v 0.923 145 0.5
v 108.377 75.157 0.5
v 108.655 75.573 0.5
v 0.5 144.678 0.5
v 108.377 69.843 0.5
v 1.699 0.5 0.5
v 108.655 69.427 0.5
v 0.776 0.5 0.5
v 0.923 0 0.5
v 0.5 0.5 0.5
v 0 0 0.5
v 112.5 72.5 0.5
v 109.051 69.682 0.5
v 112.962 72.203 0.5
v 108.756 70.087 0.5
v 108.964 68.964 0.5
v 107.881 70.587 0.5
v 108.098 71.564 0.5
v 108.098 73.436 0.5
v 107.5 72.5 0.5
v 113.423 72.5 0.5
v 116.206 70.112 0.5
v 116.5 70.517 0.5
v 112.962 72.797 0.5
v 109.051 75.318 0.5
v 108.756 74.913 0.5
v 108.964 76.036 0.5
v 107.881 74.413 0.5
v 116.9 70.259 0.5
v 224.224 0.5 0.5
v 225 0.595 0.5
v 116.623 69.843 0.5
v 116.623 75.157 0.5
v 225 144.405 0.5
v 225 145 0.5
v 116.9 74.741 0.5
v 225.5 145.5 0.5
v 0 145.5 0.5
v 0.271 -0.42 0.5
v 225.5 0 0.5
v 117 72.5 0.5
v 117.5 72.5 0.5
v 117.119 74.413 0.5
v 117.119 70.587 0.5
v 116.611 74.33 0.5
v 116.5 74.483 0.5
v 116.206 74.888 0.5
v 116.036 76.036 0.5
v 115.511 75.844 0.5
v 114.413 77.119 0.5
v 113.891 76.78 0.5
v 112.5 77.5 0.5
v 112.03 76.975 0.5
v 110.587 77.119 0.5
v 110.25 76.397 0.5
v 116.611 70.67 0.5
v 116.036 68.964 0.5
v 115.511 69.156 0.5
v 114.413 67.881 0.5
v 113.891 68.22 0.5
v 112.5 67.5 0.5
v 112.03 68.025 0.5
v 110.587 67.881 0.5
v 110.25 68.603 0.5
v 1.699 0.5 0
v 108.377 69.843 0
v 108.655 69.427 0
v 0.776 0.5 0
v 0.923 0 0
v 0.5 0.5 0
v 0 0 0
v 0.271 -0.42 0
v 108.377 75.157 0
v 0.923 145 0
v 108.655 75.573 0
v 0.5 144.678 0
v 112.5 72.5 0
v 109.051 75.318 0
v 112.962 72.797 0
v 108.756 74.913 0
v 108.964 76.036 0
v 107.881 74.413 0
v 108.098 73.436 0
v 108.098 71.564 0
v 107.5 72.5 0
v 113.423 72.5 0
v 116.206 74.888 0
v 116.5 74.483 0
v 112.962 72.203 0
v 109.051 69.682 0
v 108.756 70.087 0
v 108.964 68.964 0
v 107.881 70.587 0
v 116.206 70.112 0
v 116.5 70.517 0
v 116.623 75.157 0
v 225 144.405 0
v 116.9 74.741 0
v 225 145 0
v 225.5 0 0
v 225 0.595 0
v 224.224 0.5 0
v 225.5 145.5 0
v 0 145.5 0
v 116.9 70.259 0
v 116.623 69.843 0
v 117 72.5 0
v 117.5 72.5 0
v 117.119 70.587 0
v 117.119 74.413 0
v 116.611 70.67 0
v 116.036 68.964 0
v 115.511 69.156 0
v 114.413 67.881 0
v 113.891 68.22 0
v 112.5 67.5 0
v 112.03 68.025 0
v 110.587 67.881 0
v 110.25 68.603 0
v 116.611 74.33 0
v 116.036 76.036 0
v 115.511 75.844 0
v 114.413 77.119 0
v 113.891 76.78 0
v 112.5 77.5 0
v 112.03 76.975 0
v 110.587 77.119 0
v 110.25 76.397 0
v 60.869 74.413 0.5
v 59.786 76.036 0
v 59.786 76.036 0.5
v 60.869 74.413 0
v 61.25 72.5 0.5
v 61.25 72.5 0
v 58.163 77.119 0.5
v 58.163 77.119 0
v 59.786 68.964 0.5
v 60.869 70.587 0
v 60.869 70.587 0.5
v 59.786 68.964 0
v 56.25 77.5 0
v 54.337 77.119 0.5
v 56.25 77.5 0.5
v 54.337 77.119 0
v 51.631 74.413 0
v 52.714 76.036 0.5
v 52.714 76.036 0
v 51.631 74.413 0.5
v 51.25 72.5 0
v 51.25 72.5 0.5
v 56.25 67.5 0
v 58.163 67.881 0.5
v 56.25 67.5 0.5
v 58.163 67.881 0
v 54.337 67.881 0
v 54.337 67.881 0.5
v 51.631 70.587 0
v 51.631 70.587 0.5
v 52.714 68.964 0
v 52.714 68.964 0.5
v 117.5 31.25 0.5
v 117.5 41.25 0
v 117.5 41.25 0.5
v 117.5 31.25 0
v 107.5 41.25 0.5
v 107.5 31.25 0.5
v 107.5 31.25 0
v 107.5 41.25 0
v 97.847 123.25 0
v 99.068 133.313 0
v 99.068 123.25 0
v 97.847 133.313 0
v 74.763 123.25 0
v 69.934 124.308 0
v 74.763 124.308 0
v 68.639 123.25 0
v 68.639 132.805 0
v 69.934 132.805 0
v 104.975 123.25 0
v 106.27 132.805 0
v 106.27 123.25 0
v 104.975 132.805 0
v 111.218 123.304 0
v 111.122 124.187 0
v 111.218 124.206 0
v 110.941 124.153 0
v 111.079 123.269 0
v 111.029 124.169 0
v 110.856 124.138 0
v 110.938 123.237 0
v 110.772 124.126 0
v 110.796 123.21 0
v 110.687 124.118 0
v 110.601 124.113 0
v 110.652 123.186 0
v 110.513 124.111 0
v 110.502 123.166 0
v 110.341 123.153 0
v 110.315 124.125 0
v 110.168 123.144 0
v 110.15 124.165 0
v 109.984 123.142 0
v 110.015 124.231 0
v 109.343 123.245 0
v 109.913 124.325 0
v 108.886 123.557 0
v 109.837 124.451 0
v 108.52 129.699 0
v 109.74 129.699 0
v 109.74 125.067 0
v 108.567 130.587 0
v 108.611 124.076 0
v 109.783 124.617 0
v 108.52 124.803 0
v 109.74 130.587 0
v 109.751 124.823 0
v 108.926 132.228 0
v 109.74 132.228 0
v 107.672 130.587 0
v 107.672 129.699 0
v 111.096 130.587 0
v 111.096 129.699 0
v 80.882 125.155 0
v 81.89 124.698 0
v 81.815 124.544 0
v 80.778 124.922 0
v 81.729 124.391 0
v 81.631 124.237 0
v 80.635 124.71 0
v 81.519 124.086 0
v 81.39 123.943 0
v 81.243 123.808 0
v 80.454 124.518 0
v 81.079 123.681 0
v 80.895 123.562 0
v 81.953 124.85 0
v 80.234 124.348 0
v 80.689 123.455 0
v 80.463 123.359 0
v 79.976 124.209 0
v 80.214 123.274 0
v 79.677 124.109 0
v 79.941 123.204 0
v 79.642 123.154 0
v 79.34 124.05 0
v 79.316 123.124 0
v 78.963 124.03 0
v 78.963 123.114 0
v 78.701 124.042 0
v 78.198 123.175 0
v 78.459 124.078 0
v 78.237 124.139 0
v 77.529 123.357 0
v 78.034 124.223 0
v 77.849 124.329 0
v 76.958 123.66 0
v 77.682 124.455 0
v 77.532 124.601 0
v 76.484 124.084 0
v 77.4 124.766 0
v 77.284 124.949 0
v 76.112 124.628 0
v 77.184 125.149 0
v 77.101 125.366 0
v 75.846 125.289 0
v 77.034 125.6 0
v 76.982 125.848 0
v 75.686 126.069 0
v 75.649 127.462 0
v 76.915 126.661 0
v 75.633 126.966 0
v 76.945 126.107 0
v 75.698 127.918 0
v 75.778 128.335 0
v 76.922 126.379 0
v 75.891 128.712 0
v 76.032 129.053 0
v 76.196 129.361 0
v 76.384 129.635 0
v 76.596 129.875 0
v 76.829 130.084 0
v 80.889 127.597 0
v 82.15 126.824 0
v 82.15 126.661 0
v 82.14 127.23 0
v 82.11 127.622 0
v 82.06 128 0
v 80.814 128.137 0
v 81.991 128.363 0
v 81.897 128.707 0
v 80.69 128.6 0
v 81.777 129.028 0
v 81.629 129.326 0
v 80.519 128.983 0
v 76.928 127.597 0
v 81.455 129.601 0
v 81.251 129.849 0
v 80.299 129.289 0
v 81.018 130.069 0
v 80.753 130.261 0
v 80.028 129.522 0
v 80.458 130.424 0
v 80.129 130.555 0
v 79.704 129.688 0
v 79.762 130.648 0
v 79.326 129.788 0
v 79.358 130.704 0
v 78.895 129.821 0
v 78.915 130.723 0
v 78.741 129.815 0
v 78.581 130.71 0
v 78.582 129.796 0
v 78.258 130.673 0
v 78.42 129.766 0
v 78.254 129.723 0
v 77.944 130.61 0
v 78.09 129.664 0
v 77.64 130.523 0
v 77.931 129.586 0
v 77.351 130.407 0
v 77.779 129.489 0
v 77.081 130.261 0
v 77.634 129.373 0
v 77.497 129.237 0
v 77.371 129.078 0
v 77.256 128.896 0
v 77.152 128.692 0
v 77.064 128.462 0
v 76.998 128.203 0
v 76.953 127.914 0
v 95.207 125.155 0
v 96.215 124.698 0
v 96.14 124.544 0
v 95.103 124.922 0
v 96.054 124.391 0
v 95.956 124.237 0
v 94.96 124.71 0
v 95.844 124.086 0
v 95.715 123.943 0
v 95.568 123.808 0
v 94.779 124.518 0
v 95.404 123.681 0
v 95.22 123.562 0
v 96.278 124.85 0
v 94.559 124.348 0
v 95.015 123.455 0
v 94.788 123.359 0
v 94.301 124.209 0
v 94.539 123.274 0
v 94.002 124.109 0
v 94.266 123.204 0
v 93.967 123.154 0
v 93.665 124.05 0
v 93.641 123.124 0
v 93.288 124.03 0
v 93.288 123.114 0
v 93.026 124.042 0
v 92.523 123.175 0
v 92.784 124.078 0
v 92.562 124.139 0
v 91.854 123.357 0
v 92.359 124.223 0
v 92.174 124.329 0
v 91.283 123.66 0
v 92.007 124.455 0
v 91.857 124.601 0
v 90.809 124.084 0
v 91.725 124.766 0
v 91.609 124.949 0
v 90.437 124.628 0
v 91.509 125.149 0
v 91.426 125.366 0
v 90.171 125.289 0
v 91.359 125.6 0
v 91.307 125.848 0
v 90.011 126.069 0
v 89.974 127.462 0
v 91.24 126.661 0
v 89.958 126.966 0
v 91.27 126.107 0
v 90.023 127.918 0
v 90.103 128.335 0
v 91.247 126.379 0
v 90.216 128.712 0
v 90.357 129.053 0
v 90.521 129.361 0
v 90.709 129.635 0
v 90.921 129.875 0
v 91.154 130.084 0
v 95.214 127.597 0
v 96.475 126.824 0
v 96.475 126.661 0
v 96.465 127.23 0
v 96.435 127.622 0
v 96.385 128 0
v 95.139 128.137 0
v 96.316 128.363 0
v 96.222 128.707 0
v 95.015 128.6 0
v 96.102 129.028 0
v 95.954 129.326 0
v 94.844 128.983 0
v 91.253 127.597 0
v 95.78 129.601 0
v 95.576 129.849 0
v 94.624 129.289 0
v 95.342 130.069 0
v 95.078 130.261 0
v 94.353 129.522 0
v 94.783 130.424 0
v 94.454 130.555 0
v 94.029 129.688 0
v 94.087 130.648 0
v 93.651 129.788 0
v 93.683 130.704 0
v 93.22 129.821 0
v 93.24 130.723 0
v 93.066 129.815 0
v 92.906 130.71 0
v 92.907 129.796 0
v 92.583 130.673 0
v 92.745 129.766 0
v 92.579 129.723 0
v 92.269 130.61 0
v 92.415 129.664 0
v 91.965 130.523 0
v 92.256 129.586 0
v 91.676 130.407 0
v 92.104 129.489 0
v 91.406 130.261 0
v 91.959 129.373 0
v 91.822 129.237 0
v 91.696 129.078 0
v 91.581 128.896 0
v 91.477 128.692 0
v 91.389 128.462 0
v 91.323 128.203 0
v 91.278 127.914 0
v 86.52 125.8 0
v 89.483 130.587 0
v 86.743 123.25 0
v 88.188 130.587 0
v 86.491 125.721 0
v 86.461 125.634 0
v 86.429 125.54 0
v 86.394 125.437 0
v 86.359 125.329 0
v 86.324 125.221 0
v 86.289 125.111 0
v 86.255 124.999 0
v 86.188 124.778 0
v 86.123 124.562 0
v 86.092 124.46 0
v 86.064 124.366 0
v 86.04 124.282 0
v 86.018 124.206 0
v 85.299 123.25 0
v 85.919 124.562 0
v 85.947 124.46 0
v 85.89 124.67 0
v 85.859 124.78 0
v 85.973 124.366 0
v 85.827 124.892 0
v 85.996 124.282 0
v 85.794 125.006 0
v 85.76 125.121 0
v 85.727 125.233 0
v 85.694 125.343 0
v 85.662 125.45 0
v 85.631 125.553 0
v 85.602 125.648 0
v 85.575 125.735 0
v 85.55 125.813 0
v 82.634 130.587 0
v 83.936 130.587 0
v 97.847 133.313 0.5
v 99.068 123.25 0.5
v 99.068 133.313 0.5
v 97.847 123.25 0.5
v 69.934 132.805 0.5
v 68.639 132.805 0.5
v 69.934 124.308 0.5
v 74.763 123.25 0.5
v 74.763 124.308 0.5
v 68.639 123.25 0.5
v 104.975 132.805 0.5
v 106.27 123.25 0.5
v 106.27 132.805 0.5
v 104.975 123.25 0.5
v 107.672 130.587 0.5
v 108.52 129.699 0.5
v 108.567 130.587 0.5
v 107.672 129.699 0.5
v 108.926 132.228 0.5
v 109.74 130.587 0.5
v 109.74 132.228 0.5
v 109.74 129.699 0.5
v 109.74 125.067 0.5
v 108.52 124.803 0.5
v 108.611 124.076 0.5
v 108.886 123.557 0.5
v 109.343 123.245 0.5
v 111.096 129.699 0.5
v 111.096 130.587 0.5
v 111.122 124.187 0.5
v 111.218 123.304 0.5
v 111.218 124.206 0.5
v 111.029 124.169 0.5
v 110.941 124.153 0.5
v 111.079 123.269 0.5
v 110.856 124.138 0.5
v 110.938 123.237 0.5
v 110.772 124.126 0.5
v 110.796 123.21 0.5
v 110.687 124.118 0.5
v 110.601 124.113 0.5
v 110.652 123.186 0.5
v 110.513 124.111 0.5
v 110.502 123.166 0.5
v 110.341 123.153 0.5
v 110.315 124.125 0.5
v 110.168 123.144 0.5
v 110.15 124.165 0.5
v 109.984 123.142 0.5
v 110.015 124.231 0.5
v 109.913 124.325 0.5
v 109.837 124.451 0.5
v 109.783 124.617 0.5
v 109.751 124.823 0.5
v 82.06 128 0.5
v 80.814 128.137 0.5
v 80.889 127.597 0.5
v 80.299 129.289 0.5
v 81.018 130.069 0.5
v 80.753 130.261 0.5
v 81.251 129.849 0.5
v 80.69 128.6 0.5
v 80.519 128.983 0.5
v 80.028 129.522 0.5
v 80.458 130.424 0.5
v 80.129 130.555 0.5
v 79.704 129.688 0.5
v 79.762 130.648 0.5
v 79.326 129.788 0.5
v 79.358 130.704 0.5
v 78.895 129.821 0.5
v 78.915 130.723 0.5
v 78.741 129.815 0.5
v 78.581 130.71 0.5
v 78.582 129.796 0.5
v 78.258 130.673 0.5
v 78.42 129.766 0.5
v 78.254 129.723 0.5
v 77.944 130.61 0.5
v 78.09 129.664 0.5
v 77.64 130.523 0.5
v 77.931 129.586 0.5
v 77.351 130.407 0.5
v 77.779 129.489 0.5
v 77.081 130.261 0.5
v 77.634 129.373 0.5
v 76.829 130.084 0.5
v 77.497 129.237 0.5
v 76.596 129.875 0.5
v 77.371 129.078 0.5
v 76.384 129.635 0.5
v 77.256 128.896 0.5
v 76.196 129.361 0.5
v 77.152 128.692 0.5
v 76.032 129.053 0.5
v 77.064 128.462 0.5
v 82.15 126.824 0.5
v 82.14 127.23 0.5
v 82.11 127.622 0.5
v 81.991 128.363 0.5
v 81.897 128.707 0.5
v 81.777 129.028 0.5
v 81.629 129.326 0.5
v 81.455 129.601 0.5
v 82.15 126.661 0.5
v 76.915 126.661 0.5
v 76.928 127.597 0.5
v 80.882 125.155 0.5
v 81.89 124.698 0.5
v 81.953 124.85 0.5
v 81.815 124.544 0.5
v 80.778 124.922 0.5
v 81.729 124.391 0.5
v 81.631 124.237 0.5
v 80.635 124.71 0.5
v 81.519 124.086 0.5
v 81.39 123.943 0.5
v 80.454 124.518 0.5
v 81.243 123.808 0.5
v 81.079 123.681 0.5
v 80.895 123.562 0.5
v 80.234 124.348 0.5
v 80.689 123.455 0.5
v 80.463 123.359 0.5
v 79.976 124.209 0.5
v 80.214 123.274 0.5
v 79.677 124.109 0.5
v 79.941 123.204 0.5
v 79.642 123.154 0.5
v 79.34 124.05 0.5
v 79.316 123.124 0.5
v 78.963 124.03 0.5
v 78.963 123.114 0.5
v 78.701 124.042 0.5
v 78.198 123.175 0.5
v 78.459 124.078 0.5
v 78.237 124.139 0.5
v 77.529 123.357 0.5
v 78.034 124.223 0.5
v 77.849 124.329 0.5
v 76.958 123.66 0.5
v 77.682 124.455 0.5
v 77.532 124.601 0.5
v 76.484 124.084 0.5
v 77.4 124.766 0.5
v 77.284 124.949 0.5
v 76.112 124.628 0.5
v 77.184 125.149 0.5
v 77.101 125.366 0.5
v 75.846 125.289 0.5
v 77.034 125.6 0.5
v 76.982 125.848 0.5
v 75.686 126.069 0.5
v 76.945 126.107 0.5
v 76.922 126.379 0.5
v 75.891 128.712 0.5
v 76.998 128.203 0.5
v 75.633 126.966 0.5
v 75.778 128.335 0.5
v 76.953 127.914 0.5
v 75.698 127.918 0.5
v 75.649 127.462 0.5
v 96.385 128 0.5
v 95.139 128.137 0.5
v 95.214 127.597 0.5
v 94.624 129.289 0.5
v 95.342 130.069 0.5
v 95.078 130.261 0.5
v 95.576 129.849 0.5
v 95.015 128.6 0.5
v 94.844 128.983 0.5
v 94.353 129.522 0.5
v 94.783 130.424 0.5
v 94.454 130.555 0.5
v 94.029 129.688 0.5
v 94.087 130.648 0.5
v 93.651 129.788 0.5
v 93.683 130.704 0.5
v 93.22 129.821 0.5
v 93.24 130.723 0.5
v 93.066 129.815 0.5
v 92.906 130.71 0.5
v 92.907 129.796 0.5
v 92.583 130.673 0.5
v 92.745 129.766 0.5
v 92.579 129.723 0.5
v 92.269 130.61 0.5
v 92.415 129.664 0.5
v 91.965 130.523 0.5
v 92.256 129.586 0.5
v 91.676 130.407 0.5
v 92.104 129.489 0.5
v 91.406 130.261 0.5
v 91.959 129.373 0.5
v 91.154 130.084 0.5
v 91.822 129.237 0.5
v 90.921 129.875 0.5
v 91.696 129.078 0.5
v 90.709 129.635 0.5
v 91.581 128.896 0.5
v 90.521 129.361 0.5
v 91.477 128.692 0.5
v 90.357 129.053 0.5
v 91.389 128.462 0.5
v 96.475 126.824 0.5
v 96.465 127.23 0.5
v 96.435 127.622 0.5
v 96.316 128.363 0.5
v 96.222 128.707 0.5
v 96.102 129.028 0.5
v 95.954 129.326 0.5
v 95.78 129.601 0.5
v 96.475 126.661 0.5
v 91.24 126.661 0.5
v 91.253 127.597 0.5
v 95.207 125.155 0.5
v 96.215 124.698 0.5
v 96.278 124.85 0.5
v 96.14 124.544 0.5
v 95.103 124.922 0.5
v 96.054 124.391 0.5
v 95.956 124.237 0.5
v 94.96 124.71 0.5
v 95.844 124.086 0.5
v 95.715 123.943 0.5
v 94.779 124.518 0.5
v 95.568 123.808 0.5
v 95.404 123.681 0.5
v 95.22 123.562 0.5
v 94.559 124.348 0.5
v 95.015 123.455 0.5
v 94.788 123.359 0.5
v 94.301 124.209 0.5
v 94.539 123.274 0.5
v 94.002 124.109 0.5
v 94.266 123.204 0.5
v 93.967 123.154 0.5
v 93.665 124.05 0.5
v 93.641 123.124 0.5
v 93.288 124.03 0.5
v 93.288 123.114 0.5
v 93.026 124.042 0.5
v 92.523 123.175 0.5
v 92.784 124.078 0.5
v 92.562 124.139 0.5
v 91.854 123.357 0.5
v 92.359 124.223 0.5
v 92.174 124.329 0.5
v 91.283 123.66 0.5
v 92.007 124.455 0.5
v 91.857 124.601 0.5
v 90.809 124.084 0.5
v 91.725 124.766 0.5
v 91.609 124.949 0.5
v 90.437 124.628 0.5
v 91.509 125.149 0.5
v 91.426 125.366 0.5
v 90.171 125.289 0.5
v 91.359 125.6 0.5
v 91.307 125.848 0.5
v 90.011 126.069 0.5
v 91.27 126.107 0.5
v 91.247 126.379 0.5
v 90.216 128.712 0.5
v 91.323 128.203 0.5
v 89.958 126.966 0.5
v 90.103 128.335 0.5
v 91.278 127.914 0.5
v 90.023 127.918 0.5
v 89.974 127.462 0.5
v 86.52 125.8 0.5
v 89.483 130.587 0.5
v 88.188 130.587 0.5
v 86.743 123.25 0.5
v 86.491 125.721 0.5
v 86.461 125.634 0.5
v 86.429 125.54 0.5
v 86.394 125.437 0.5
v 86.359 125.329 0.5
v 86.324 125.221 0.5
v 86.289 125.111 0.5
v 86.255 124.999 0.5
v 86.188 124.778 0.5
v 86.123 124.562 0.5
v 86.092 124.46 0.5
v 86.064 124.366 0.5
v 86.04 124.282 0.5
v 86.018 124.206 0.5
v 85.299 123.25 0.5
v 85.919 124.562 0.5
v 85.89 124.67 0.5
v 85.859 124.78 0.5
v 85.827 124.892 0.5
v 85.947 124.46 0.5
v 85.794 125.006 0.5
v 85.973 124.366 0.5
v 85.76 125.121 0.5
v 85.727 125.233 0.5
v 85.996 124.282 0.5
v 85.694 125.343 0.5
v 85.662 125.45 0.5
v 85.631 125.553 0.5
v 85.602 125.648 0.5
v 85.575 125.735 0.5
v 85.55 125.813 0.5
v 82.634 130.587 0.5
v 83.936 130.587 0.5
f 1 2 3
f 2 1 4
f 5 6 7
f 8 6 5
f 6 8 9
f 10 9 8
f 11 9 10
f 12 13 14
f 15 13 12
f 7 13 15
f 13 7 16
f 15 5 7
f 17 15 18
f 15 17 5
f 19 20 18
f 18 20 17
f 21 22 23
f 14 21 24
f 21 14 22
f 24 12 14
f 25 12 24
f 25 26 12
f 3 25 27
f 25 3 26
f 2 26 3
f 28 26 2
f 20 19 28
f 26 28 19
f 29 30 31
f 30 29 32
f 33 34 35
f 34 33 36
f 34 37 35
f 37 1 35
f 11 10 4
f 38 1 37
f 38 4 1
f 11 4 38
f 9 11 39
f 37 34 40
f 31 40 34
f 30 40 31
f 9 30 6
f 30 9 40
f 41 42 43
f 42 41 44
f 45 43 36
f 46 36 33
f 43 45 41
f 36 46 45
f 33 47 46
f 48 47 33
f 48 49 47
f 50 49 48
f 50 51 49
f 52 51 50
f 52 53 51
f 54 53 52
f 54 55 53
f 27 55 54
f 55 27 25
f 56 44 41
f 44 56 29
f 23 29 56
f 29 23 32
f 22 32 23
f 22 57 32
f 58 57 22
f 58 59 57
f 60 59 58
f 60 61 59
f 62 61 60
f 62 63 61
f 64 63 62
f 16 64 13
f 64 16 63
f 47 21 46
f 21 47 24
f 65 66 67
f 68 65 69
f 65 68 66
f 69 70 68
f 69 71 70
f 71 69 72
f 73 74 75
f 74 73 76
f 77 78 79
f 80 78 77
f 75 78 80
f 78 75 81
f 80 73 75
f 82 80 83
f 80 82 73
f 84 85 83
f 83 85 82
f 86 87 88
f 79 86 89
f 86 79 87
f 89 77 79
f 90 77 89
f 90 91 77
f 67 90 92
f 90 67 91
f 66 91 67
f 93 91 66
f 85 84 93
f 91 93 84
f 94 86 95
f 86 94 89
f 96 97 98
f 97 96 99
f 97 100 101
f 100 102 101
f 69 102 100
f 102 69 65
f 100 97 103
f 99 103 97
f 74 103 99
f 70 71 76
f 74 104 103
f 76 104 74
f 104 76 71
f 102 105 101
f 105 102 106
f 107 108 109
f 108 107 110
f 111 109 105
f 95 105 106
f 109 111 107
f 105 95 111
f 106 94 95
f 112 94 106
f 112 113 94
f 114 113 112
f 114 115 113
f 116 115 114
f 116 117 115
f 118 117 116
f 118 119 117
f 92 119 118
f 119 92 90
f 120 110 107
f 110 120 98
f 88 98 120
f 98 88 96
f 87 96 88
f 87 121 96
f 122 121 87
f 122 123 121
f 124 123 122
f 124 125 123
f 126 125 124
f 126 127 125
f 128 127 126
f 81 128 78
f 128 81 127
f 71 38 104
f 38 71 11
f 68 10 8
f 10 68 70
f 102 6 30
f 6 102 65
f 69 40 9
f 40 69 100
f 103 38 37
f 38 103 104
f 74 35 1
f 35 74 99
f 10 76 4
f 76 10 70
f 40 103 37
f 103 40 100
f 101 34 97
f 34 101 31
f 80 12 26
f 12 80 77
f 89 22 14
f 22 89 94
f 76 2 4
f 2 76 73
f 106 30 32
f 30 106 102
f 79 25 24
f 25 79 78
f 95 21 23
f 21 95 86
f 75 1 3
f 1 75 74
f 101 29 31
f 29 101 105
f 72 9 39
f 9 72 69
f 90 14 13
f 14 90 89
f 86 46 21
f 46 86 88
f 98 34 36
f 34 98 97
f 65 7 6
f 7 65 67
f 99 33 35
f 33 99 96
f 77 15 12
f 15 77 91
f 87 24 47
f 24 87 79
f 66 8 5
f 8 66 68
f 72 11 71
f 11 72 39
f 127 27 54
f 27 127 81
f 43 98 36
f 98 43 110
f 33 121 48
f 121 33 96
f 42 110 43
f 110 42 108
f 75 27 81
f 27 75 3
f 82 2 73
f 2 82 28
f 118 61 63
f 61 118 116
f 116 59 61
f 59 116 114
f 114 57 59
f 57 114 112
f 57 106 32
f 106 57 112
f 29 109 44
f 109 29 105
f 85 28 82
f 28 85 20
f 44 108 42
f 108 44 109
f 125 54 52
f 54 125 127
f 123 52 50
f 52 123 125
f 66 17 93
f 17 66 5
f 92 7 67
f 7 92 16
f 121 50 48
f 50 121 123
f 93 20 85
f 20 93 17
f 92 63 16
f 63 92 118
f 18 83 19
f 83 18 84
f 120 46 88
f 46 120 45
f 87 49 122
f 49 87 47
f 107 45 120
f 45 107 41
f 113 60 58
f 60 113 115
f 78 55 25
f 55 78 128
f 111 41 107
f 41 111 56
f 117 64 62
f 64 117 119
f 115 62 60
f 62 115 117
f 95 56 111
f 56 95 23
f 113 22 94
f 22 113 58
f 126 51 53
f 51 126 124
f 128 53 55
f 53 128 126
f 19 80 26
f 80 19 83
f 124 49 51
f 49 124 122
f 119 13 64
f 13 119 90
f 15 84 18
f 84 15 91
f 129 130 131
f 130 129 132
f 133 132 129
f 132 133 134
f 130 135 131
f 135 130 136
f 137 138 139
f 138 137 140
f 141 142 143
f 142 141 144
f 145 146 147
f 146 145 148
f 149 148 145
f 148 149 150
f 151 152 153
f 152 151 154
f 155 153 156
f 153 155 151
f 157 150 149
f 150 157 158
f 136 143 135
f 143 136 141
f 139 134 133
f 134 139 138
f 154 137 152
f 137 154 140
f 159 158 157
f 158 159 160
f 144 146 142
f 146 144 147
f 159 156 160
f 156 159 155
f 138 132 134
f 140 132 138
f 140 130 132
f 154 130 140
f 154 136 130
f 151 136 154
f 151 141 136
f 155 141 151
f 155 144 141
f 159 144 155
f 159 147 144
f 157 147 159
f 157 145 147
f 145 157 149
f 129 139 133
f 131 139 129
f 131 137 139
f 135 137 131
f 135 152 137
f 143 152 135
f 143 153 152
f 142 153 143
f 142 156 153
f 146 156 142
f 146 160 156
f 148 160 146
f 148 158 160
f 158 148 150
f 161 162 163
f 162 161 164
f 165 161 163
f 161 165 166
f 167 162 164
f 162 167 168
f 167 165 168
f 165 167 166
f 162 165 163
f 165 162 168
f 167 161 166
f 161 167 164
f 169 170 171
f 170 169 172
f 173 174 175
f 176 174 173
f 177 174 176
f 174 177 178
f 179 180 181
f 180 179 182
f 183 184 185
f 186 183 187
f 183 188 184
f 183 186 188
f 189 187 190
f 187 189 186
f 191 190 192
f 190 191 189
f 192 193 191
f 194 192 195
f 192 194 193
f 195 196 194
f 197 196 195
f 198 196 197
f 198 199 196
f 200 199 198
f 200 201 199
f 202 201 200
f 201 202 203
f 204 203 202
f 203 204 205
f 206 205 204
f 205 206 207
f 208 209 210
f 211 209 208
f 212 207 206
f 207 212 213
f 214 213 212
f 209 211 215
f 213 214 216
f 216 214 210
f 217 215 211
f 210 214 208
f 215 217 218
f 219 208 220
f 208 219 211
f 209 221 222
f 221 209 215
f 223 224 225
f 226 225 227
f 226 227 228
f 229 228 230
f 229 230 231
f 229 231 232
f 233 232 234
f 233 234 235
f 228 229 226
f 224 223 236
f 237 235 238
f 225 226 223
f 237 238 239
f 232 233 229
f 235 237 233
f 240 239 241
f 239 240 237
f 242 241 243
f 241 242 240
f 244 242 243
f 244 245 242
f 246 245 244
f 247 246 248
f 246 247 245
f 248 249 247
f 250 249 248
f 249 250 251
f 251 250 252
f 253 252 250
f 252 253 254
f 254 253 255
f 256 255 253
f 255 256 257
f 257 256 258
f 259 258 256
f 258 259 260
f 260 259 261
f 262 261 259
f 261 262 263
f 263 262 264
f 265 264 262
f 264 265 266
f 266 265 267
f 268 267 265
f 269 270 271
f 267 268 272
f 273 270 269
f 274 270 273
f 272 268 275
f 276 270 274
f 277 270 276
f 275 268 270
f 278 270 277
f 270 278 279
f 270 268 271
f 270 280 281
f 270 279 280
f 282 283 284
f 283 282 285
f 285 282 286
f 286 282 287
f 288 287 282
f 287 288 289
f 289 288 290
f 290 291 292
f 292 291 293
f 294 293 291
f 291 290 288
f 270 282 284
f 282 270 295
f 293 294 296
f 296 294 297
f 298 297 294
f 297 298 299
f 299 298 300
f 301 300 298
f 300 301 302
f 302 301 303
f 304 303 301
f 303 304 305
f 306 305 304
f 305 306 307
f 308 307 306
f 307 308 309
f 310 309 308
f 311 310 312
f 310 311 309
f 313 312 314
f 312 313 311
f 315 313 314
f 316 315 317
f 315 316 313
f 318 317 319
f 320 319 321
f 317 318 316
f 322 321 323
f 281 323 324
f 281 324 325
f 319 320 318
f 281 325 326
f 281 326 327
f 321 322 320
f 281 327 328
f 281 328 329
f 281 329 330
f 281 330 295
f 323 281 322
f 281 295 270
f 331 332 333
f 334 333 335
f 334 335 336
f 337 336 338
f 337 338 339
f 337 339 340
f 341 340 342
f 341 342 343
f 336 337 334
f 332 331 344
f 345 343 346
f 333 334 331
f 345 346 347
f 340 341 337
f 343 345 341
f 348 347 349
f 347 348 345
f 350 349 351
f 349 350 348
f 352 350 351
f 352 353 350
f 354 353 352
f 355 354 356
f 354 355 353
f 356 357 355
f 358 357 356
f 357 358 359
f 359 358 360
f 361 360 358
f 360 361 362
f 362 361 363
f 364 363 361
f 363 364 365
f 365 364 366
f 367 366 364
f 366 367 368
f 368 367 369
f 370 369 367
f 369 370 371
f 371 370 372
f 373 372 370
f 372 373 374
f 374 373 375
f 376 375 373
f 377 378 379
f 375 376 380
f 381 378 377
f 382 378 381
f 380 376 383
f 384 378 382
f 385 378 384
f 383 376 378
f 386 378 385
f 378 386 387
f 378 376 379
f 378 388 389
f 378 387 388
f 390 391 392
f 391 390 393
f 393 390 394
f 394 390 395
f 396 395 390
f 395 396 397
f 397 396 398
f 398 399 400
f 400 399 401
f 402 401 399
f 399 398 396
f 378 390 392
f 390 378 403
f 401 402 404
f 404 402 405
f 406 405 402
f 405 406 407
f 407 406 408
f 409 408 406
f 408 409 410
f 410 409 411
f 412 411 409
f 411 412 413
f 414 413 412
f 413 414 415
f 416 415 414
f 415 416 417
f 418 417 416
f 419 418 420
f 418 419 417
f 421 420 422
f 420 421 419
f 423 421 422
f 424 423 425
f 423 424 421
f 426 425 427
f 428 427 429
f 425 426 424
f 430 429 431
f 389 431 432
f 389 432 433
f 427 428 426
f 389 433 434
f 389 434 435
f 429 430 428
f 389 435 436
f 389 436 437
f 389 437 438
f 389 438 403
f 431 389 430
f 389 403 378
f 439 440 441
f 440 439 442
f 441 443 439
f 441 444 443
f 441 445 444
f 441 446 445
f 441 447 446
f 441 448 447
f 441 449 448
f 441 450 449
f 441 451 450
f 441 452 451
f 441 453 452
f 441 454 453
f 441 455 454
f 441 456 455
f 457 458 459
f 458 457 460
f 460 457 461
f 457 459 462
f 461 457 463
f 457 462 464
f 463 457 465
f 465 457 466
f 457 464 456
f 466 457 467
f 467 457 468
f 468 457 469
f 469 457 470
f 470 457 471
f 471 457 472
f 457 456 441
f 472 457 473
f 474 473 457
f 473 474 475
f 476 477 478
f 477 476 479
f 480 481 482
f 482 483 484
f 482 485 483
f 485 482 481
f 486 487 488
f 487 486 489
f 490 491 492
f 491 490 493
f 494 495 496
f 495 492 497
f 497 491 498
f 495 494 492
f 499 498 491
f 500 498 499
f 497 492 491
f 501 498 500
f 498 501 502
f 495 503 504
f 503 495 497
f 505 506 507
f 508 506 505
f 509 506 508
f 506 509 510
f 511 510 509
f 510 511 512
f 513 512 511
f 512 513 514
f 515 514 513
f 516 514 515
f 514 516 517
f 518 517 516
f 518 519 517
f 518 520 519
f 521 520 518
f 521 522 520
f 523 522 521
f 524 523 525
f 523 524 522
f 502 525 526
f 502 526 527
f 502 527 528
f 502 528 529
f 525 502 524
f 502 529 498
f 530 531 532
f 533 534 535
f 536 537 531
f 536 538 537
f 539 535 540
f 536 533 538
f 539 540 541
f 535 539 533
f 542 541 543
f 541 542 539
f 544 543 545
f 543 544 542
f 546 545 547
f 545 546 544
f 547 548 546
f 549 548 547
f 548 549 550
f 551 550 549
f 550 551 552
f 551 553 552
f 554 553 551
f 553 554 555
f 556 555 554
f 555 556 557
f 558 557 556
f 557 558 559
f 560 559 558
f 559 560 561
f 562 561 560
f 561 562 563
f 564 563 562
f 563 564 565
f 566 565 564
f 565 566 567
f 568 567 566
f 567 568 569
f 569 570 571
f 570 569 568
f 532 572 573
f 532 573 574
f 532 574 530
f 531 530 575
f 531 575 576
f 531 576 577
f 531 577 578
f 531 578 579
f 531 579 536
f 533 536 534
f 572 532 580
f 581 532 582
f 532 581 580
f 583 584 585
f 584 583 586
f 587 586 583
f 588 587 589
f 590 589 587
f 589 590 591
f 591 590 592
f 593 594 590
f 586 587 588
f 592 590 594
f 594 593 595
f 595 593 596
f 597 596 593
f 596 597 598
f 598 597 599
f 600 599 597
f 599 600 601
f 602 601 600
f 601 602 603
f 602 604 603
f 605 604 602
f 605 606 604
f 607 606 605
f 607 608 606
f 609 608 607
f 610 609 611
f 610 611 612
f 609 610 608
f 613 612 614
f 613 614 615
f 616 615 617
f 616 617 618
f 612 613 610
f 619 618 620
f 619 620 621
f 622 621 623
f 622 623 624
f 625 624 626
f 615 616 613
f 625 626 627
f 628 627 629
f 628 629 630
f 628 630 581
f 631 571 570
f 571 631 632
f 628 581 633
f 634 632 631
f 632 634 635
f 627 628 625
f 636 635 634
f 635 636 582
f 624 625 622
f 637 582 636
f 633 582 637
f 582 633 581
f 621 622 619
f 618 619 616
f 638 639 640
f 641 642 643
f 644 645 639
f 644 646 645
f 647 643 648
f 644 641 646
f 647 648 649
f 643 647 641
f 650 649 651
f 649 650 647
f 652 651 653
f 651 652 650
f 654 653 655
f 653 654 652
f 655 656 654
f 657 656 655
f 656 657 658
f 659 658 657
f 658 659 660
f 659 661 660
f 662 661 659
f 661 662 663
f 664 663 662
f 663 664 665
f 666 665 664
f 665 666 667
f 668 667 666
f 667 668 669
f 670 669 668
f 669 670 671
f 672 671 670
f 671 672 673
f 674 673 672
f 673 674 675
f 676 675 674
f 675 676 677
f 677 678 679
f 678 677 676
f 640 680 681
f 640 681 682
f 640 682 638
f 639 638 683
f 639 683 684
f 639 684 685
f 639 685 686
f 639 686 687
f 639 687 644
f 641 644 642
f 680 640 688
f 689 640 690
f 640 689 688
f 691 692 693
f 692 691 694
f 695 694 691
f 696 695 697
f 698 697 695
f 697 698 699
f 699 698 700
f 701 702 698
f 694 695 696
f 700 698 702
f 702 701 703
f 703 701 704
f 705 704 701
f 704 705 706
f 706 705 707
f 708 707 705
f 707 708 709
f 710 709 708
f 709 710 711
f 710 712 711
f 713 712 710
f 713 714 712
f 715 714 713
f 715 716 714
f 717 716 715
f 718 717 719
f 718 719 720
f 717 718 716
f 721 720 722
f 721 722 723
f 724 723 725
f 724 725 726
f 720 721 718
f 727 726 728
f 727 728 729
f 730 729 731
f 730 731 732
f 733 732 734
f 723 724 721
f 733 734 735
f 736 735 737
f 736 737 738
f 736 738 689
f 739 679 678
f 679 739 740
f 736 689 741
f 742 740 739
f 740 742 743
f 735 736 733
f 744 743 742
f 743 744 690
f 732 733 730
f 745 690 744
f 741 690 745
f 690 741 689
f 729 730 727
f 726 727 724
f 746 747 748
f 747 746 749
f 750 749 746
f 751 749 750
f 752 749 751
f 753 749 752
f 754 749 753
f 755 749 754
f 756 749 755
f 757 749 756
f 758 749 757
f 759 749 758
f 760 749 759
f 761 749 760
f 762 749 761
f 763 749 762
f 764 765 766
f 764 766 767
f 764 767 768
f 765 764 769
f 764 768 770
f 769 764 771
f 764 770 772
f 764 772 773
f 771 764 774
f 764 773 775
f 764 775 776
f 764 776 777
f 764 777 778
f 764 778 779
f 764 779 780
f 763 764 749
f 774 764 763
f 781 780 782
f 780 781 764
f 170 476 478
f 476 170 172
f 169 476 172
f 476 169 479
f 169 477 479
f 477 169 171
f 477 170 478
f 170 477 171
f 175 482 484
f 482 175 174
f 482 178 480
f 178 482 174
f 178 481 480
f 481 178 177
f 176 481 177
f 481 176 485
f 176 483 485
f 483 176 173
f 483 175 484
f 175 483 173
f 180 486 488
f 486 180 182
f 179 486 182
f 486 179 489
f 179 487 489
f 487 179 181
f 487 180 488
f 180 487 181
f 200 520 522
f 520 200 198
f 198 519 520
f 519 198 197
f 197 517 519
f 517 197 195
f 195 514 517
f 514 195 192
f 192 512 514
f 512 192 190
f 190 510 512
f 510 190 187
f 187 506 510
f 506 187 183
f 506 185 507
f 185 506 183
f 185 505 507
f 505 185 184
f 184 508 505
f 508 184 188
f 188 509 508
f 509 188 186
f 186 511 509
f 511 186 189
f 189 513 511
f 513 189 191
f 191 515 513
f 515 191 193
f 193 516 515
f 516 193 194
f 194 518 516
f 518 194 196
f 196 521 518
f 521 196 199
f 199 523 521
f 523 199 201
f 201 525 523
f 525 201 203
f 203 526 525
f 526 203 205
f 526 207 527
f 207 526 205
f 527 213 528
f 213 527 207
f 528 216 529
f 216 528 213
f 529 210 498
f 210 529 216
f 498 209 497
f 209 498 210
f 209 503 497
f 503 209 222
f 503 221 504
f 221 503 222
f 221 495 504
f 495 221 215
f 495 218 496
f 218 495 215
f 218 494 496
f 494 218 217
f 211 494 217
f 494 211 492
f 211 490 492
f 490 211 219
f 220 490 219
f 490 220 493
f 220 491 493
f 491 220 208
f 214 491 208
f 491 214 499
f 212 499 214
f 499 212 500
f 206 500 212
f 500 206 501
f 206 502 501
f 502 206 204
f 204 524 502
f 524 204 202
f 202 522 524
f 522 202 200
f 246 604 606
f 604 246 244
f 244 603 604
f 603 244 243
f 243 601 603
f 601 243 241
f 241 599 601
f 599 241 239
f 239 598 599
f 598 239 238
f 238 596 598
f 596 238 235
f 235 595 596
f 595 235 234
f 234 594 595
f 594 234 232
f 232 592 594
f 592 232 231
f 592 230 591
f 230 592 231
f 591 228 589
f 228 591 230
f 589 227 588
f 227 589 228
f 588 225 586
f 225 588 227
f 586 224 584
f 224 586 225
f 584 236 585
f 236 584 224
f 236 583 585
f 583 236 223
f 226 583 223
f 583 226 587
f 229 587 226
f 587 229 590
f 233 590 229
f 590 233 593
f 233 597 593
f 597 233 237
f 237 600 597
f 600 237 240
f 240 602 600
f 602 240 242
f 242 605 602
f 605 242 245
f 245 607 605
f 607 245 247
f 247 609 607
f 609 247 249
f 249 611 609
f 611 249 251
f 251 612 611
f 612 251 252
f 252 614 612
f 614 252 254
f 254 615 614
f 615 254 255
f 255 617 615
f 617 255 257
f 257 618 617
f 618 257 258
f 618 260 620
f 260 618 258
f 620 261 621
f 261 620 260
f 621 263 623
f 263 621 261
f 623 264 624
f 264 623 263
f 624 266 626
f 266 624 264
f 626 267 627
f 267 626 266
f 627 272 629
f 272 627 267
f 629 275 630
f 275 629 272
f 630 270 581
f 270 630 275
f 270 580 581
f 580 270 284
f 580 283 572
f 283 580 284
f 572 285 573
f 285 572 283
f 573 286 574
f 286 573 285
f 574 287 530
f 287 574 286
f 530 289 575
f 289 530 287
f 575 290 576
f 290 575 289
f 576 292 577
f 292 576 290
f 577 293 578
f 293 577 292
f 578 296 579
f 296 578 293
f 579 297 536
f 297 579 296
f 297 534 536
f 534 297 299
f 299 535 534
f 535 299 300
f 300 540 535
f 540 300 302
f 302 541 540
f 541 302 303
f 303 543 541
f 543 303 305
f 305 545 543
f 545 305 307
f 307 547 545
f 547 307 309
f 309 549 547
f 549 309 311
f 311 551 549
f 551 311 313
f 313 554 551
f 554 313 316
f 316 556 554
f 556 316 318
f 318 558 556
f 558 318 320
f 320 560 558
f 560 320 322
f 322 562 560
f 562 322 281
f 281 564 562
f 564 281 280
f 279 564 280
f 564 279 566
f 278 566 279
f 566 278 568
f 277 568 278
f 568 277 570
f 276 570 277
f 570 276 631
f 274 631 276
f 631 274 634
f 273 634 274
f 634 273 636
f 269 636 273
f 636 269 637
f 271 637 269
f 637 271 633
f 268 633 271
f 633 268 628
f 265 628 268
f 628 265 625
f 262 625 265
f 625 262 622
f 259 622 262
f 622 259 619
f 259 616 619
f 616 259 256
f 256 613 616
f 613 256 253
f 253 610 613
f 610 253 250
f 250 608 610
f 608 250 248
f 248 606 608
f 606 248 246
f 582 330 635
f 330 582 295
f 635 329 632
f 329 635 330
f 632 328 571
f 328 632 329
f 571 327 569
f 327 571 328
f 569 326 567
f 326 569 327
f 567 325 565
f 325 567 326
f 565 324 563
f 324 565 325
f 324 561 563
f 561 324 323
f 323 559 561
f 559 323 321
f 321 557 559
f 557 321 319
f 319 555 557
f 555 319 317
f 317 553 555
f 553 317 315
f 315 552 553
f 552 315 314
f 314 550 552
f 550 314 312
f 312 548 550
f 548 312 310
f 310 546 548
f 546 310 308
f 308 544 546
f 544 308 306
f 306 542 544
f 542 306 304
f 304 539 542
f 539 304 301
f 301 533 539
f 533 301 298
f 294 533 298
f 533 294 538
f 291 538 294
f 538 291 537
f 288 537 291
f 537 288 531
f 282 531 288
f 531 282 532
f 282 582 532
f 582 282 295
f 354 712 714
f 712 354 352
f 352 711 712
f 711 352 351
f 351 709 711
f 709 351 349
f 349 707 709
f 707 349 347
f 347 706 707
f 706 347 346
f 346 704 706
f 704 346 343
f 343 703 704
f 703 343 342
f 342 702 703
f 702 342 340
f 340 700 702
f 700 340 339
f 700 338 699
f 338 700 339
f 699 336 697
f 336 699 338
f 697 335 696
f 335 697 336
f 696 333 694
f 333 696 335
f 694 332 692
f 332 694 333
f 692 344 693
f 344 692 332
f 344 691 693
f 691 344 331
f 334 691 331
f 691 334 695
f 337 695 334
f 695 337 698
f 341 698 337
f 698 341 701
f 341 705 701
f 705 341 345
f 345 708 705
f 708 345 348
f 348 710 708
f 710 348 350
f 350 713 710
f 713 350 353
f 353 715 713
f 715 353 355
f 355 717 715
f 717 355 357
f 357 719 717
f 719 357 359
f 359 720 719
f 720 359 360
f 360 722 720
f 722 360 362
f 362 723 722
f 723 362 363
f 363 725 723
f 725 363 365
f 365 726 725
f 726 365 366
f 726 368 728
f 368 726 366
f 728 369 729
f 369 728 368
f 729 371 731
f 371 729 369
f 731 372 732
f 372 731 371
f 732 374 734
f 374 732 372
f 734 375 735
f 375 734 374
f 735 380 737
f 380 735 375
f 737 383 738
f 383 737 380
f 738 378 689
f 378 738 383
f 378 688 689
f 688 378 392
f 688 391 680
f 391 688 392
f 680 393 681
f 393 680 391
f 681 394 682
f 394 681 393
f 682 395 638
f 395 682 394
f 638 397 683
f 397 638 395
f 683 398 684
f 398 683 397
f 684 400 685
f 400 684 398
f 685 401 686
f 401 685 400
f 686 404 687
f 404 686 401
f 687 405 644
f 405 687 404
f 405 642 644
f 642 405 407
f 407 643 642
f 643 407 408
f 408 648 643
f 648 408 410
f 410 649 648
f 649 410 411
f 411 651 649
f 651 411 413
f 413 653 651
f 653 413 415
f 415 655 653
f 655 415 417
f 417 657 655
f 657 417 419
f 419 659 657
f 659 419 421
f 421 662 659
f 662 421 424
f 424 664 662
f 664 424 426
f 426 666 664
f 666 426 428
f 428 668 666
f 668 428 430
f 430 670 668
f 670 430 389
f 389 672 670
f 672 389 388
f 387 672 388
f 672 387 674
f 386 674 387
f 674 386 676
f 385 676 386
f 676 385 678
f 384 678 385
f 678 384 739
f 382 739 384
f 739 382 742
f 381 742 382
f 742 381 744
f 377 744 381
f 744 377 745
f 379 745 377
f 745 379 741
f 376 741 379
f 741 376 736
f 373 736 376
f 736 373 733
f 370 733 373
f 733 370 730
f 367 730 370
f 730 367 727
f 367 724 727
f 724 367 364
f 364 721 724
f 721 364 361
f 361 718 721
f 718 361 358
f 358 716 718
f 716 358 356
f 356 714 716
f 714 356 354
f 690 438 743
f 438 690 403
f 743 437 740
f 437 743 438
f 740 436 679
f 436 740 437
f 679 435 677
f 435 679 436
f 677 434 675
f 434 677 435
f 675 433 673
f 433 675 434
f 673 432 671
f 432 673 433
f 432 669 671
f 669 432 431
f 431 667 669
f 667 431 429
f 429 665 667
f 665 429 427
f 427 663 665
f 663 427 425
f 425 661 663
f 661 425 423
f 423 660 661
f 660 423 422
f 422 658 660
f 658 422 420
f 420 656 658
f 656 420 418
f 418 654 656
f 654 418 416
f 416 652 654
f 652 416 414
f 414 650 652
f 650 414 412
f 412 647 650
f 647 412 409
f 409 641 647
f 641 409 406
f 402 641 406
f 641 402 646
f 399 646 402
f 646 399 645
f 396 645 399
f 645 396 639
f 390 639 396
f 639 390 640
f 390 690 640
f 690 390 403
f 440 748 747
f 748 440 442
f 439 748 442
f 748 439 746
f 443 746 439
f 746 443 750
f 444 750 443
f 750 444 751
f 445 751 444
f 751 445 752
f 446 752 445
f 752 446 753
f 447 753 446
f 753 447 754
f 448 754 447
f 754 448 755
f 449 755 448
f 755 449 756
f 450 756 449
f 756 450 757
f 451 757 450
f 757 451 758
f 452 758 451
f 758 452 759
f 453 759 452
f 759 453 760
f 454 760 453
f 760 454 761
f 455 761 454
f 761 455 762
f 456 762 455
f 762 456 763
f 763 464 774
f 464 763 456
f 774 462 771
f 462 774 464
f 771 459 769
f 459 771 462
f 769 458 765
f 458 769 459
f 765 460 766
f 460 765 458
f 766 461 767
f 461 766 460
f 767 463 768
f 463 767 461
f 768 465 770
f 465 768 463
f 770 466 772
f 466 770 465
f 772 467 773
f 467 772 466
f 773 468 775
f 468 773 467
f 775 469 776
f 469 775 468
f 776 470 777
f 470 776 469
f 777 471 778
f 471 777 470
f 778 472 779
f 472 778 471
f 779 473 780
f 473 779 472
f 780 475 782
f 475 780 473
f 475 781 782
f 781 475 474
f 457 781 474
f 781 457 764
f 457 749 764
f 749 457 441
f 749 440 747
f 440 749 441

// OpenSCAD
//
//  Leveling Test Generator
//
//  EvilTeach 11/2015
//

// PrintBed Dimensions
xMax = 225;         // FlashForge Creator Dual
yMax = 145;

// Print Height
height = 0.5;



// Crosshairs are useful to see how close you are to the center of the plate
module zero_crosshairs()
{
    translate([xMax / 2.0, yMax / 2.0, 0]) 
        difference()
        {
            cylinder(r = 5.0, h = height);
            cylinder(r = 4.5, h = height);
        }
}



// Print lines to show any obvious leveling issues.
module plate_leveling_lines()
{
    // all around the outside
    translate([0, 0, 0])
        cube([xMax, height, height]);

    translate([0, yMax, 0])
       cube([xMax, height, height]);

    translate([0, 0, 0])
        cube([height, yMax, height]);

    translate([xMax, 0, 0])
        cube([height, yMax, height]);

    // This seems to cover up a defect in openscad.
    // I haven't investigated it seriously, so i is probably my bug
    translate([xMax, yMax, 0])
        cube([height, height, height]);


    // Calculate the angle to draw the diagonals
    a = xMax;
    b = yMax;
    c = sqrt(a * a + b * b);
    
    sinB = b / c;
    angleB = asin(sinB);
    
    translate([xMax, 0, 0])
        rotate(90 - angleB, 0, 0)
            cube([height, c , height]);

    translate([0, 0, 0])
        rotate(angleB - 90, 0, 0)
            cube([height, c, height]);
        
}



// Draw two small shapes with fill
module fill_some_shapes()
{
    translate([xMax / 4, yMax / 2, 0])
        cylinder(r = 5, h = height);
    
    cubeSize = 10;
    translate([xMax / 2 - cubeSize / 2, yMax / 4 - cubeSize / 2, 0])
        cube([cubeSize, cubeSize, height]);
}



// Toss a few letters into the mix 
module some_text()
{
    translate([xMax * 0.30, yMax * 0.85, 0])  
        linear_extrude(height = height)
        text("Level It");
}



module main()
{
    color("yellow") plate_leveling_lines();
    color("cyan")   zero_crosshairs();
    color("lime")   fill_some_shapes();
    color("red")    some_text();
}

main();
